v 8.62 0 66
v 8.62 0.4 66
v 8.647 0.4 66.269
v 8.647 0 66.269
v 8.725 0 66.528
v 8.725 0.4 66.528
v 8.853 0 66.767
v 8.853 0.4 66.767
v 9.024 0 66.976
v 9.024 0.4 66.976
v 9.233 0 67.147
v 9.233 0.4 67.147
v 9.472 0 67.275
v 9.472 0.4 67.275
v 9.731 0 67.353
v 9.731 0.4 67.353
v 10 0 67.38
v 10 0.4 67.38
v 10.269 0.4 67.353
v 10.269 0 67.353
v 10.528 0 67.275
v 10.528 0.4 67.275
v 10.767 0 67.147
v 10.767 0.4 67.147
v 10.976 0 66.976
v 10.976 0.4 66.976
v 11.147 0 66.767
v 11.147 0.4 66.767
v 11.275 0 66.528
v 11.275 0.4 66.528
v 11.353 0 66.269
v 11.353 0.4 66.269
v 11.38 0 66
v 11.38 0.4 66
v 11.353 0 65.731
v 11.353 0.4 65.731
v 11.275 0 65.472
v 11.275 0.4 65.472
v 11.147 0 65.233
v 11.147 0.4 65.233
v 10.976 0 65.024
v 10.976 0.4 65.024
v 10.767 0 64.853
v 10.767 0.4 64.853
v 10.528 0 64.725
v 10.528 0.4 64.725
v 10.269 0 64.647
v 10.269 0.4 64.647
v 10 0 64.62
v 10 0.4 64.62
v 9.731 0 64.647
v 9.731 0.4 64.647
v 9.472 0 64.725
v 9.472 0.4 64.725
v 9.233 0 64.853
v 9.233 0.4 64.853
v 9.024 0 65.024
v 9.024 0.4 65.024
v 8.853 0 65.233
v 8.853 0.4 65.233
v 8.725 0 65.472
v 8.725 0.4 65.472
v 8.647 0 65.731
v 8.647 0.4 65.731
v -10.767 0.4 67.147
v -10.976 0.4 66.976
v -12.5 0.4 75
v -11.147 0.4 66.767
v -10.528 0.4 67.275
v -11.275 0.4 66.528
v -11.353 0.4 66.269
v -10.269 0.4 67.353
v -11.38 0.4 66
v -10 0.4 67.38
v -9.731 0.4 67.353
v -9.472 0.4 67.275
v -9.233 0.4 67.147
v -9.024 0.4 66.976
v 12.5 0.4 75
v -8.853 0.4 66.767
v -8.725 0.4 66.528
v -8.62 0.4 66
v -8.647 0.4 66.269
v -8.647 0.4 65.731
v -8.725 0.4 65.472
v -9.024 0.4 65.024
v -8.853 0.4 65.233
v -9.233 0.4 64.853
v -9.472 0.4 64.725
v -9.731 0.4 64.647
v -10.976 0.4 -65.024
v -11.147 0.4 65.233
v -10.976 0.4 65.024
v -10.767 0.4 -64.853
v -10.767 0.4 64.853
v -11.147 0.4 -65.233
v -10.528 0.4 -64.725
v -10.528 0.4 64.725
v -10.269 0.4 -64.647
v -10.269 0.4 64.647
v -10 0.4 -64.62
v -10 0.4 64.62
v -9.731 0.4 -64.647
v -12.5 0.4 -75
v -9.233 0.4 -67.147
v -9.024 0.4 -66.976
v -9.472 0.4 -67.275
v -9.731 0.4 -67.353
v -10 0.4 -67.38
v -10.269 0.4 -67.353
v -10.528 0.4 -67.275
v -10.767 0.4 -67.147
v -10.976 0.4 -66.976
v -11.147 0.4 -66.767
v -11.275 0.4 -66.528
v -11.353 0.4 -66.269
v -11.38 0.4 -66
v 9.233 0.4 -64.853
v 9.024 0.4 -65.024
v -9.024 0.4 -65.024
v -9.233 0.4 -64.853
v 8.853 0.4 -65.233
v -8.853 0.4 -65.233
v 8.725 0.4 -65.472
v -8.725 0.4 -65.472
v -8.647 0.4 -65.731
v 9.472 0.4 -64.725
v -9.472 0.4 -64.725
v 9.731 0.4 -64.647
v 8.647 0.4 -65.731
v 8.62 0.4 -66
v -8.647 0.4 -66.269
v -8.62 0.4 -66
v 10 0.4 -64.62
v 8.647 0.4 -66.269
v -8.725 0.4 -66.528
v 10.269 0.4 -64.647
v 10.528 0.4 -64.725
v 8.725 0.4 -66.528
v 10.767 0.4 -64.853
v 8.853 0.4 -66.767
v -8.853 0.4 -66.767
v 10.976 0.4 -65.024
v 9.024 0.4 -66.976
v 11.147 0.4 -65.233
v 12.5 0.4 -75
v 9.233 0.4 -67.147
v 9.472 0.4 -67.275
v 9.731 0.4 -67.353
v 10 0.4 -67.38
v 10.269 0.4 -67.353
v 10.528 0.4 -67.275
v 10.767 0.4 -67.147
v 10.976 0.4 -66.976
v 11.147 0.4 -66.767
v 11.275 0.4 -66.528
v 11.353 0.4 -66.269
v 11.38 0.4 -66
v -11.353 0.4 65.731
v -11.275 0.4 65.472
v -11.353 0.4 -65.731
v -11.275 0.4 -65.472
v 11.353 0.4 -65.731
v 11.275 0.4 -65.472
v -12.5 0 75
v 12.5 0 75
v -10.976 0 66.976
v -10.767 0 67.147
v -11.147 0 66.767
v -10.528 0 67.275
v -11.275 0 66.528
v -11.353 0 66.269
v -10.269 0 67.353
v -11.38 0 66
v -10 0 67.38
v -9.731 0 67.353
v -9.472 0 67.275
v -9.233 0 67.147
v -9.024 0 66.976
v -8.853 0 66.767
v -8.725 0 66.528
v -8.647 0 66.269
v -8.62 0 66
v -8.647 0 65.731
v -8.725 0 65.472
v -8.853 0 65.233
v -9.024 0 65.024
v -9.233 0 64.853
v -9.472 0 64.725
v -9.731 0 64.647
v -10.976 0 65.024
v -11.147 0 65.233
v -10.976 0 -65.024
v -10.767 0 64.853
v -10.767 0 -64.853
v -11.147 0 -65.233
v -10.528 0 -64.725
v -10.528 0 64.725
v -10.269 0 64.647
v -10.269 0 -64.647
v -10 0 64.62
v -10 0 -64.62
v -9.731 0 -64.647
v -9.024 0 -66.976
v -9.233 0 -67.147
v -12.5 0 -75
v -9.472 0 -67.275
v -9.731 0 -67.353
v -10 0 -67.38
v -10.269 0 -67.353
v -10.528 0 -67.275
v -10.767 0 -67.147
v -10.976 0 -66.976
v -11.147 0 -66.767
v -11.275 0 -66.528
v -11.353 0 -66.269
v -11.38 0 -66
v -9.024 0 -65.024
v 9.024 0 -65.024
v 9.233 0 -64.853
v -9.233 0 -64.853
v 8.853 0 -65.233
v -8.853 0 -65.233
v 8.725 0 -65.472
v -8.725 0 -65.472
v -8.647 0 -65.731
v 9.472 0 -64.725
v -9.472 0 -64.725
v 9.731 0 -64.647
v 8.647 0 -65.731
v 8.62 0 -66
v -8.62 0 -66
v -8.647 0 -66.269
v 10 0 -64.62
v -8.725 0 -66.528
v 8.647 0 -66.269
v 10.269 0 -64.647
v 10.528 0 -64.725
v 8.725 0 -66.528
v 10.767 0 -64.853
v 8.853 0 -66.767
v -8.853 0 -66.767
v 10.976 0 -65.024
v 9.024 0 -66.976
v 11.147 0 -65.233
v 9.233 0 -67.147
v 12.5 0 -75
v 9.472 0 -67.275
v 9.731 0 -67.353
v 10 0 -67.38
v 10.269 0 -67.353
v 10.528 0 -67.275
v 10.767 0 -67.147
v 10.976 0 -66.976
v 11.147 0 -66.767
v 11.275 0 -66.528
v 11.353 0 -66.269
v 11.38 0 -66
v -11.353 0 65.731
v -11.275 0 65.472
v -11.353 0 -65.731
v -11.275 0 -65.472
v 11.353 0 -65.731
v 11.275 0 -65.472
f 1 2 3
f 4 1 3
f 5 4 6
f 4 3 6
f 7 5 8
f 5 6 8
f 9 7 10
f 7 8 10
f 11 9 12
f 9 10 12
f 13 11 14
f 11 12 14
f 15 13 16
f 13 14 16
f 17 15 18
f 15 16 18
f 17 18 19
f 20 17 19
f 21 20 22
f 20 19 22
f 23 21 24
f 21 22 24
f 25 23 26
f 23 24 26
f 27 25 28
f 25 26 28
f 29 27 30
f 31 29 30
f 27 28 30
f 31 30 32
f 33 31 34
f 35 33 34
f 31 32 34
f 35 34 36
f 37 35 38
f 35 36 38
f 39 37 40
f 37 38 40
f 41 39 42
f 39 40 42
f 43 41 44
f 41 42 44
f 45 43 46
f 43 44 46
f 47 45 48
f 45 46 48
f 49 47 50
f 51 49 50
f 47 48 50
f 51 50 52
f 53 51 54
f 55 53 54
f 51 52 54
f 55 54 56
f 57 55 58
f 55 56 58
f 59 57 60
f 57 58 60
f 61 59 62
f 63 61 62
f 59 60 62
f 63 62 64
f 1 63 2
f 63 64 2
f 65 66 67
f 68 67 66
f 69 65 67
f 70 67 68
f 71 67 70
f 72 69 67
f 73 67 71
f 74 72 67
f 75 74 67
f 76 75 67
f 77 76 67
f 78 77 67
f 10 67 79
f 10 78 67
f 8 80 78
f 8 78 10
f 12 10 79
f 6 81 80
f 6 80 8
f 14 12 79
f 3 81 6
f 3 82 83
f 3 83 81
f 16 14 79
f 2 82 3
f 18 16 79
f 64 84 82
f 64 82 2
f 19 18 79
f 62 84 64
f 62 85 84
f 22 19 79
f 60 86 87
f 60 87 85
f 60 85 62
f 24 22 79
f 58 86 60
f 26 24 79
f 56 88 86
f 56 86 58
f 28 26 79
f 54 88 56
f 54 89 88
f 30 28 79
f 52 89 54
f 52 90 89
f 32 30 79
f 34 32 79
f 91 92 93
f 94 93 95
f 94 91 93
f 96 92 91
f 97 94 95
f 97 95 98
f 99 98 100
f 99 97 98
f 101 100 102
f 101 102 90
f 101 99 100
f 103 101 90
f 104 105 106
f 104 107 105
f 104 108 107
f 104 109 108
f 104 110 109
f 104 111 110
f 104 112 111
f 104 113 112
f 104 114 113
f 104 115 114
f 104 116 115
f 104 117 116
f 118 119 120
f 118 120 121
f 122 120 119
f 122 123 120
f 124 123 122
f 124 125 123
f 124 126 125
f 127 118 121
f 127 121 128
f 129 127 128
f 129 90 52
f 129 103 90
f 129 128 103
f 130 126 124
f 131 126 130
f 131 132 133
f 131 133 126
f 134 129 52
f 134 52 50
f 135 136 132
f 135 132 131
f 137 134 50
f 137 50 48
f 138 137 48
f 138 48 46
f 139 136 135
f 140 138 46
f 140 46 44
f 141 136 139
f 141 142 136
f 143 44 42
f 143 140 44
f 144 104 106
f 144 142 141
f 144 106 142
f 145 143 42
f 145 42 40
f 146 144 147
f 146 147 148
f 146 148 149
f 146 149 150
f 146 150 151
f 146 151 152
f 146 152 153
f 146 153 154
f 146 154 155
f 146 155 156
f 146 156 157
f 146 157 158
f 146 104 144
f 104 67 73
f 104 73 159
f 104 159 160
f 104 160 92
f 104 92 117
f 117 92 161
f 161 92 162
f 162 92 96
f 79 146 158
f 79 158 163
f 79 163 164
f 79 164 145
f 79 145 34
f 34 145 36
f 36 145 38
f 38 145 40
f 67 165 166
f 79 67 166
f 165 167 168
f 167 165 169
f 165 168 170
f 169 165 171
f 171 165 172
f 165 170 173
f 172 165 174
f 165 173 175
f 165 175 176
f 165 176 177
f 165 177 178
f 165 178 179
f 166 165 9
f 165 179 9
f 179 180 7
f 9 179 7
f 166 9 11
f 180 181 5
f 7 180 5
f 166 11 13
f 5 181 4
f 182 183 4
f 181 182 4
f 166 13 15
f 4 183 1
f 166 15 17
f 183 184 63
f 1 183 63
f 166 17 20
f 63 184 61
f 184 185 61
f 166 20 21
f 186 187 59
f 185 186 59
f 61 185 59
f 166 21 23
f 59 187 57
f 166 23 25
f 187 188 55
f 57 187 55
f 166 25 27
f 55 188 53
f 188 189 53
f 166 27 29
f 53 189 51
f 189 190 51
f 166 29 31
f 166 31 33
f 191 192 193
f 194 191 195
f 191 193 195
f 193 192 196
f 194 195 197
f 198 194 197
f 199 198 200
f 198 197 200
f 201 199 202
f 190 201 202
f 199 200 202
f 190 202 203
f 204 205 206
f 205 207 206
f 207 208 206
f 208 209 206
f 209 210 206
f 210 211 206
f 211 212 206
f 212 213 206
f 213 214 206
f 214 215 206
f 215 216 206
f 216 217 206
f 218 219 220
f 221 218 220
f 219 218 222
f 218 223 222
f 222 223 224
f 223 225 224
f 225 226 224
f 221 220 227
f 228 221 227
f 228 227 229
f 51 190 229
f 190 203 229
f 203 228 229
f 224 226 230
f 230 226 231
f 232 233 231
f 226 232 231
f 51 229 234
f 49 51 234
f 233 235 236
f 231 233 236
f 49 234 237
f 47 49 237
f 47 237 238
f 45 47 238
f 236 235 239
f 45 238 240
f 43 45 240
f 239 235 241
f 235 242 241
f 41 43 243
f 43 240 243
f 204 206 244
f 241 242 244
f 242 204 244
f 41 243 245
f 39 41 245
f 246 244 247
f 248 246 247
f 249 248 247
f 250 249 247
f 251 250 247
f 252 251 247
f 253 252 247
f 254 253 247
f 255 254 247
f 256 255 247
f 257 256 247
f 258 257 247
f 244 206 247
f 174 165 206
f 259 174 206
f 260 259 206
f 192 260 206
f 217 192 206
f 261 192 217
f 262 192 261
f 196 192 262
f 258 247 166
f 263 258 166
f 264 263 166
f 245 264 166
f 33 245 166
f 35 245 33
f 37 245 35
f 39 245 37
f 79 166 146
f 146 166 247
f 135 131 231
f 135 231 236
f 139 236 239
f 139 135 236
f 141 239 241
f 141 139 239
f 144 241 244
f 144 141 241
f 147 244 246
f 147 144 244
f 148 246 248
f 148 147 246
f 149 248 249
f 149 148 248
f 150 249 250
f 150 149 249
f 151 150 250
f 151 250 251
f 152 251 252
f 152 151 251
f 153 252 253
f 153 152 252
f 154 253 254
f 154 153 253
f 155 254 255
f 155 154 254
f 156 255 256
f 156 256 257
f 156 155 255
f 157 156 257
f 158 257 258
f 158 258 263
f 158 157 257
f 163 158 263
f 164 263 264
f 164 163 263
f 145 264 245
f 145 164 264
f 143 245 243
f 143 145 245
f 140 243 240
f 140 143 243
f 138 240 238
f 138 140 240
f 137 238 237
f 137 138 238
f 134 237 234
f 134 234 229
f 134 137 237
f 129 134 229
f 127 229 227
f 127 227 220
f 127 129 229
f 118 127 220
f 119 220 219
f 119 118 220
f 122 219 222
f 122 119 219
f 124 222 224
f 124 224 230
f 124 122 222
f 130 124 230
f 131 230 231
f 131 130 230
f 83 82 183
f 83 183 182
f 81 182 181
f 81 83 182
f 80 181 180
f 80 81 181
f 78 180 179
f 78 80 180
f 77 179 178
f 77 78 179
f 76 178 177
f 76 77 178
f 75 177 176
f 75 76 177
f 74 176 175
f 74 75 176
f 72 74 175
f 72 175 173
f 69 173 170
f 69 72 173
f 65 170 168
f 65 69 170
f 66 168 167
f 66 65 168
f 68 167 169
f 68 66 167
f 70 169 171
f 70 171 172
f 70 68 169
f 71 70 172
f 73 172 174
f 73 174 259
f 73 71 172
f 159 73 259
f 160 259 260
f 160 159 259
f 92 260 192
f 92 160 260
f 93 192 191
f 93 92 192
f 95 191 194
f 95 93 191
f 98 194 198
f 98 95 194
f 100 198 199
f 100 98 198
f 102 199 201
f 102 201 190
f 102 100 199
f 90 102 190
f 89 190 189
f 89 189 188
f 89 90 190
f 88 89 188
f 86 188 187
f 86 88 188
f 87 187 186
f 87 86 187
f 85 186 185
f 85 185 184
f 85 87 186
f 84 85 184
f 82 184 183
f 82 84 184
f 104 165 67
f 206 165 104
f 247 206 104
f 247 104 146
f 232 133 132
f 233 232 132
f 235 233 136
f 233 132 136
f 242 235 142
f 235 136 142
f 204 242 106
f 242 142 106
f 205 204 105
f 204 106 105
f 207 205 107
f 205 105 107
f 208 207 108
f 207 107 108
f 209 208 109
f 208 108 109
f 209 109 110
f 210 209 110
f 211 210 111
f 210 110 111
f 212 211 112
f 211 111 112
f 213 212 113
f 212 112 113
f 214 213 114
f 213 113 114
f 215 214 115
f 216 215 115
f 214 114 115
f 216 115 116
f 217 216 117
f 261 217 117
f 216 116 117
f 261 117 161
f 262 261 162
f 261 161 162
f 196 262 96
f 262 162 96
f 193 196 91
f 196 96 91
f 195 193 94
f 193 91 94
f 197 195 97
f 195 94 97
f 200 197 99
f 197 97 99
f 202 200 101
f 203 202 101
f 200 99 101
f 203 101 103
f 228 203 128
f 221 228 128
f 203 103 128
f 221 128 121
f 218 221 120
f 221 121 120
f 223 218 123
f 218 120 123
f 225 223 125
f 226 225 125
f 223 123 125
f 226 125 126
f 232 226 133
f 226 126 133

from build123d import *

# Parameters (mm, degrees)
SKETCH1_W               = 25
SKETCH1_H               = 150
BOSS_EXTRUDE1_DEPTH     = 0.4
SKETCH2_R               = 1.38
CUT_EXTRUDE1_DEPTH      = 0.4
MIRROR2_COPY_1_SKETCH_R = 1.38
MIRROR2_COPY_1_DEPTH    = 0.4


with BuildPart() as part:
    # Sketch1 → Boss-Extrude1 (new body)
    with BuildSketch(Plane(origin=(0, 0, 0), x_dir=(1, 0, 0), z_dir=(0, 1, 0))):
        Rectangle(SKETCH1_W, SKETCH1_H)
    extrude(amount=BOSS_EXTRUDE1_DEPTH)

    # Sketch2 → Cut-Extrude1 (cut)
    with BuildSketch(Plane(origin=(0, 0.4, 0), x_dir=(1, 0, 0), z_dir=(0, 1, 0))):
        with Locations((-10, 66)):
            Circle(SKETCH2_R)
    cut_extrude1 = extrude(amount=-CUT_EXTRUDE1_DEPTH, mode=Mode.SUBTRACT)

    # Mirror1: Cut-Extrude1 across plane
    add(cut_extrude1.mirror(Plane(origin=(0, 0, 0), x_dir=(0, 0, 1), z_dir=(1, 0, 0))), mode=Mode.SUBTRACT)

    # Mirror2: Cut-Extrude1 across plane
    add(cut_extrude1.mirror(Plane.XY), mode=Mode.SUBTRACT)

    # Mirror2 copy 1 sketch → Mirror2 copy 1 (cut)
    with BuildSketch(Plane(origin=(0, 0.4, 0), x_dir=(-1, 0, 0), z_dir=(0, 1, 0))):
        with Locations((-10, 66)):
            Circle(MIRROR2_COPY_1_SKETCH_R)
    extrude(amount=-MIRROR2_COPY_1_DEPTH, mode=Mode.SUBTRACT)


solid = part.part
